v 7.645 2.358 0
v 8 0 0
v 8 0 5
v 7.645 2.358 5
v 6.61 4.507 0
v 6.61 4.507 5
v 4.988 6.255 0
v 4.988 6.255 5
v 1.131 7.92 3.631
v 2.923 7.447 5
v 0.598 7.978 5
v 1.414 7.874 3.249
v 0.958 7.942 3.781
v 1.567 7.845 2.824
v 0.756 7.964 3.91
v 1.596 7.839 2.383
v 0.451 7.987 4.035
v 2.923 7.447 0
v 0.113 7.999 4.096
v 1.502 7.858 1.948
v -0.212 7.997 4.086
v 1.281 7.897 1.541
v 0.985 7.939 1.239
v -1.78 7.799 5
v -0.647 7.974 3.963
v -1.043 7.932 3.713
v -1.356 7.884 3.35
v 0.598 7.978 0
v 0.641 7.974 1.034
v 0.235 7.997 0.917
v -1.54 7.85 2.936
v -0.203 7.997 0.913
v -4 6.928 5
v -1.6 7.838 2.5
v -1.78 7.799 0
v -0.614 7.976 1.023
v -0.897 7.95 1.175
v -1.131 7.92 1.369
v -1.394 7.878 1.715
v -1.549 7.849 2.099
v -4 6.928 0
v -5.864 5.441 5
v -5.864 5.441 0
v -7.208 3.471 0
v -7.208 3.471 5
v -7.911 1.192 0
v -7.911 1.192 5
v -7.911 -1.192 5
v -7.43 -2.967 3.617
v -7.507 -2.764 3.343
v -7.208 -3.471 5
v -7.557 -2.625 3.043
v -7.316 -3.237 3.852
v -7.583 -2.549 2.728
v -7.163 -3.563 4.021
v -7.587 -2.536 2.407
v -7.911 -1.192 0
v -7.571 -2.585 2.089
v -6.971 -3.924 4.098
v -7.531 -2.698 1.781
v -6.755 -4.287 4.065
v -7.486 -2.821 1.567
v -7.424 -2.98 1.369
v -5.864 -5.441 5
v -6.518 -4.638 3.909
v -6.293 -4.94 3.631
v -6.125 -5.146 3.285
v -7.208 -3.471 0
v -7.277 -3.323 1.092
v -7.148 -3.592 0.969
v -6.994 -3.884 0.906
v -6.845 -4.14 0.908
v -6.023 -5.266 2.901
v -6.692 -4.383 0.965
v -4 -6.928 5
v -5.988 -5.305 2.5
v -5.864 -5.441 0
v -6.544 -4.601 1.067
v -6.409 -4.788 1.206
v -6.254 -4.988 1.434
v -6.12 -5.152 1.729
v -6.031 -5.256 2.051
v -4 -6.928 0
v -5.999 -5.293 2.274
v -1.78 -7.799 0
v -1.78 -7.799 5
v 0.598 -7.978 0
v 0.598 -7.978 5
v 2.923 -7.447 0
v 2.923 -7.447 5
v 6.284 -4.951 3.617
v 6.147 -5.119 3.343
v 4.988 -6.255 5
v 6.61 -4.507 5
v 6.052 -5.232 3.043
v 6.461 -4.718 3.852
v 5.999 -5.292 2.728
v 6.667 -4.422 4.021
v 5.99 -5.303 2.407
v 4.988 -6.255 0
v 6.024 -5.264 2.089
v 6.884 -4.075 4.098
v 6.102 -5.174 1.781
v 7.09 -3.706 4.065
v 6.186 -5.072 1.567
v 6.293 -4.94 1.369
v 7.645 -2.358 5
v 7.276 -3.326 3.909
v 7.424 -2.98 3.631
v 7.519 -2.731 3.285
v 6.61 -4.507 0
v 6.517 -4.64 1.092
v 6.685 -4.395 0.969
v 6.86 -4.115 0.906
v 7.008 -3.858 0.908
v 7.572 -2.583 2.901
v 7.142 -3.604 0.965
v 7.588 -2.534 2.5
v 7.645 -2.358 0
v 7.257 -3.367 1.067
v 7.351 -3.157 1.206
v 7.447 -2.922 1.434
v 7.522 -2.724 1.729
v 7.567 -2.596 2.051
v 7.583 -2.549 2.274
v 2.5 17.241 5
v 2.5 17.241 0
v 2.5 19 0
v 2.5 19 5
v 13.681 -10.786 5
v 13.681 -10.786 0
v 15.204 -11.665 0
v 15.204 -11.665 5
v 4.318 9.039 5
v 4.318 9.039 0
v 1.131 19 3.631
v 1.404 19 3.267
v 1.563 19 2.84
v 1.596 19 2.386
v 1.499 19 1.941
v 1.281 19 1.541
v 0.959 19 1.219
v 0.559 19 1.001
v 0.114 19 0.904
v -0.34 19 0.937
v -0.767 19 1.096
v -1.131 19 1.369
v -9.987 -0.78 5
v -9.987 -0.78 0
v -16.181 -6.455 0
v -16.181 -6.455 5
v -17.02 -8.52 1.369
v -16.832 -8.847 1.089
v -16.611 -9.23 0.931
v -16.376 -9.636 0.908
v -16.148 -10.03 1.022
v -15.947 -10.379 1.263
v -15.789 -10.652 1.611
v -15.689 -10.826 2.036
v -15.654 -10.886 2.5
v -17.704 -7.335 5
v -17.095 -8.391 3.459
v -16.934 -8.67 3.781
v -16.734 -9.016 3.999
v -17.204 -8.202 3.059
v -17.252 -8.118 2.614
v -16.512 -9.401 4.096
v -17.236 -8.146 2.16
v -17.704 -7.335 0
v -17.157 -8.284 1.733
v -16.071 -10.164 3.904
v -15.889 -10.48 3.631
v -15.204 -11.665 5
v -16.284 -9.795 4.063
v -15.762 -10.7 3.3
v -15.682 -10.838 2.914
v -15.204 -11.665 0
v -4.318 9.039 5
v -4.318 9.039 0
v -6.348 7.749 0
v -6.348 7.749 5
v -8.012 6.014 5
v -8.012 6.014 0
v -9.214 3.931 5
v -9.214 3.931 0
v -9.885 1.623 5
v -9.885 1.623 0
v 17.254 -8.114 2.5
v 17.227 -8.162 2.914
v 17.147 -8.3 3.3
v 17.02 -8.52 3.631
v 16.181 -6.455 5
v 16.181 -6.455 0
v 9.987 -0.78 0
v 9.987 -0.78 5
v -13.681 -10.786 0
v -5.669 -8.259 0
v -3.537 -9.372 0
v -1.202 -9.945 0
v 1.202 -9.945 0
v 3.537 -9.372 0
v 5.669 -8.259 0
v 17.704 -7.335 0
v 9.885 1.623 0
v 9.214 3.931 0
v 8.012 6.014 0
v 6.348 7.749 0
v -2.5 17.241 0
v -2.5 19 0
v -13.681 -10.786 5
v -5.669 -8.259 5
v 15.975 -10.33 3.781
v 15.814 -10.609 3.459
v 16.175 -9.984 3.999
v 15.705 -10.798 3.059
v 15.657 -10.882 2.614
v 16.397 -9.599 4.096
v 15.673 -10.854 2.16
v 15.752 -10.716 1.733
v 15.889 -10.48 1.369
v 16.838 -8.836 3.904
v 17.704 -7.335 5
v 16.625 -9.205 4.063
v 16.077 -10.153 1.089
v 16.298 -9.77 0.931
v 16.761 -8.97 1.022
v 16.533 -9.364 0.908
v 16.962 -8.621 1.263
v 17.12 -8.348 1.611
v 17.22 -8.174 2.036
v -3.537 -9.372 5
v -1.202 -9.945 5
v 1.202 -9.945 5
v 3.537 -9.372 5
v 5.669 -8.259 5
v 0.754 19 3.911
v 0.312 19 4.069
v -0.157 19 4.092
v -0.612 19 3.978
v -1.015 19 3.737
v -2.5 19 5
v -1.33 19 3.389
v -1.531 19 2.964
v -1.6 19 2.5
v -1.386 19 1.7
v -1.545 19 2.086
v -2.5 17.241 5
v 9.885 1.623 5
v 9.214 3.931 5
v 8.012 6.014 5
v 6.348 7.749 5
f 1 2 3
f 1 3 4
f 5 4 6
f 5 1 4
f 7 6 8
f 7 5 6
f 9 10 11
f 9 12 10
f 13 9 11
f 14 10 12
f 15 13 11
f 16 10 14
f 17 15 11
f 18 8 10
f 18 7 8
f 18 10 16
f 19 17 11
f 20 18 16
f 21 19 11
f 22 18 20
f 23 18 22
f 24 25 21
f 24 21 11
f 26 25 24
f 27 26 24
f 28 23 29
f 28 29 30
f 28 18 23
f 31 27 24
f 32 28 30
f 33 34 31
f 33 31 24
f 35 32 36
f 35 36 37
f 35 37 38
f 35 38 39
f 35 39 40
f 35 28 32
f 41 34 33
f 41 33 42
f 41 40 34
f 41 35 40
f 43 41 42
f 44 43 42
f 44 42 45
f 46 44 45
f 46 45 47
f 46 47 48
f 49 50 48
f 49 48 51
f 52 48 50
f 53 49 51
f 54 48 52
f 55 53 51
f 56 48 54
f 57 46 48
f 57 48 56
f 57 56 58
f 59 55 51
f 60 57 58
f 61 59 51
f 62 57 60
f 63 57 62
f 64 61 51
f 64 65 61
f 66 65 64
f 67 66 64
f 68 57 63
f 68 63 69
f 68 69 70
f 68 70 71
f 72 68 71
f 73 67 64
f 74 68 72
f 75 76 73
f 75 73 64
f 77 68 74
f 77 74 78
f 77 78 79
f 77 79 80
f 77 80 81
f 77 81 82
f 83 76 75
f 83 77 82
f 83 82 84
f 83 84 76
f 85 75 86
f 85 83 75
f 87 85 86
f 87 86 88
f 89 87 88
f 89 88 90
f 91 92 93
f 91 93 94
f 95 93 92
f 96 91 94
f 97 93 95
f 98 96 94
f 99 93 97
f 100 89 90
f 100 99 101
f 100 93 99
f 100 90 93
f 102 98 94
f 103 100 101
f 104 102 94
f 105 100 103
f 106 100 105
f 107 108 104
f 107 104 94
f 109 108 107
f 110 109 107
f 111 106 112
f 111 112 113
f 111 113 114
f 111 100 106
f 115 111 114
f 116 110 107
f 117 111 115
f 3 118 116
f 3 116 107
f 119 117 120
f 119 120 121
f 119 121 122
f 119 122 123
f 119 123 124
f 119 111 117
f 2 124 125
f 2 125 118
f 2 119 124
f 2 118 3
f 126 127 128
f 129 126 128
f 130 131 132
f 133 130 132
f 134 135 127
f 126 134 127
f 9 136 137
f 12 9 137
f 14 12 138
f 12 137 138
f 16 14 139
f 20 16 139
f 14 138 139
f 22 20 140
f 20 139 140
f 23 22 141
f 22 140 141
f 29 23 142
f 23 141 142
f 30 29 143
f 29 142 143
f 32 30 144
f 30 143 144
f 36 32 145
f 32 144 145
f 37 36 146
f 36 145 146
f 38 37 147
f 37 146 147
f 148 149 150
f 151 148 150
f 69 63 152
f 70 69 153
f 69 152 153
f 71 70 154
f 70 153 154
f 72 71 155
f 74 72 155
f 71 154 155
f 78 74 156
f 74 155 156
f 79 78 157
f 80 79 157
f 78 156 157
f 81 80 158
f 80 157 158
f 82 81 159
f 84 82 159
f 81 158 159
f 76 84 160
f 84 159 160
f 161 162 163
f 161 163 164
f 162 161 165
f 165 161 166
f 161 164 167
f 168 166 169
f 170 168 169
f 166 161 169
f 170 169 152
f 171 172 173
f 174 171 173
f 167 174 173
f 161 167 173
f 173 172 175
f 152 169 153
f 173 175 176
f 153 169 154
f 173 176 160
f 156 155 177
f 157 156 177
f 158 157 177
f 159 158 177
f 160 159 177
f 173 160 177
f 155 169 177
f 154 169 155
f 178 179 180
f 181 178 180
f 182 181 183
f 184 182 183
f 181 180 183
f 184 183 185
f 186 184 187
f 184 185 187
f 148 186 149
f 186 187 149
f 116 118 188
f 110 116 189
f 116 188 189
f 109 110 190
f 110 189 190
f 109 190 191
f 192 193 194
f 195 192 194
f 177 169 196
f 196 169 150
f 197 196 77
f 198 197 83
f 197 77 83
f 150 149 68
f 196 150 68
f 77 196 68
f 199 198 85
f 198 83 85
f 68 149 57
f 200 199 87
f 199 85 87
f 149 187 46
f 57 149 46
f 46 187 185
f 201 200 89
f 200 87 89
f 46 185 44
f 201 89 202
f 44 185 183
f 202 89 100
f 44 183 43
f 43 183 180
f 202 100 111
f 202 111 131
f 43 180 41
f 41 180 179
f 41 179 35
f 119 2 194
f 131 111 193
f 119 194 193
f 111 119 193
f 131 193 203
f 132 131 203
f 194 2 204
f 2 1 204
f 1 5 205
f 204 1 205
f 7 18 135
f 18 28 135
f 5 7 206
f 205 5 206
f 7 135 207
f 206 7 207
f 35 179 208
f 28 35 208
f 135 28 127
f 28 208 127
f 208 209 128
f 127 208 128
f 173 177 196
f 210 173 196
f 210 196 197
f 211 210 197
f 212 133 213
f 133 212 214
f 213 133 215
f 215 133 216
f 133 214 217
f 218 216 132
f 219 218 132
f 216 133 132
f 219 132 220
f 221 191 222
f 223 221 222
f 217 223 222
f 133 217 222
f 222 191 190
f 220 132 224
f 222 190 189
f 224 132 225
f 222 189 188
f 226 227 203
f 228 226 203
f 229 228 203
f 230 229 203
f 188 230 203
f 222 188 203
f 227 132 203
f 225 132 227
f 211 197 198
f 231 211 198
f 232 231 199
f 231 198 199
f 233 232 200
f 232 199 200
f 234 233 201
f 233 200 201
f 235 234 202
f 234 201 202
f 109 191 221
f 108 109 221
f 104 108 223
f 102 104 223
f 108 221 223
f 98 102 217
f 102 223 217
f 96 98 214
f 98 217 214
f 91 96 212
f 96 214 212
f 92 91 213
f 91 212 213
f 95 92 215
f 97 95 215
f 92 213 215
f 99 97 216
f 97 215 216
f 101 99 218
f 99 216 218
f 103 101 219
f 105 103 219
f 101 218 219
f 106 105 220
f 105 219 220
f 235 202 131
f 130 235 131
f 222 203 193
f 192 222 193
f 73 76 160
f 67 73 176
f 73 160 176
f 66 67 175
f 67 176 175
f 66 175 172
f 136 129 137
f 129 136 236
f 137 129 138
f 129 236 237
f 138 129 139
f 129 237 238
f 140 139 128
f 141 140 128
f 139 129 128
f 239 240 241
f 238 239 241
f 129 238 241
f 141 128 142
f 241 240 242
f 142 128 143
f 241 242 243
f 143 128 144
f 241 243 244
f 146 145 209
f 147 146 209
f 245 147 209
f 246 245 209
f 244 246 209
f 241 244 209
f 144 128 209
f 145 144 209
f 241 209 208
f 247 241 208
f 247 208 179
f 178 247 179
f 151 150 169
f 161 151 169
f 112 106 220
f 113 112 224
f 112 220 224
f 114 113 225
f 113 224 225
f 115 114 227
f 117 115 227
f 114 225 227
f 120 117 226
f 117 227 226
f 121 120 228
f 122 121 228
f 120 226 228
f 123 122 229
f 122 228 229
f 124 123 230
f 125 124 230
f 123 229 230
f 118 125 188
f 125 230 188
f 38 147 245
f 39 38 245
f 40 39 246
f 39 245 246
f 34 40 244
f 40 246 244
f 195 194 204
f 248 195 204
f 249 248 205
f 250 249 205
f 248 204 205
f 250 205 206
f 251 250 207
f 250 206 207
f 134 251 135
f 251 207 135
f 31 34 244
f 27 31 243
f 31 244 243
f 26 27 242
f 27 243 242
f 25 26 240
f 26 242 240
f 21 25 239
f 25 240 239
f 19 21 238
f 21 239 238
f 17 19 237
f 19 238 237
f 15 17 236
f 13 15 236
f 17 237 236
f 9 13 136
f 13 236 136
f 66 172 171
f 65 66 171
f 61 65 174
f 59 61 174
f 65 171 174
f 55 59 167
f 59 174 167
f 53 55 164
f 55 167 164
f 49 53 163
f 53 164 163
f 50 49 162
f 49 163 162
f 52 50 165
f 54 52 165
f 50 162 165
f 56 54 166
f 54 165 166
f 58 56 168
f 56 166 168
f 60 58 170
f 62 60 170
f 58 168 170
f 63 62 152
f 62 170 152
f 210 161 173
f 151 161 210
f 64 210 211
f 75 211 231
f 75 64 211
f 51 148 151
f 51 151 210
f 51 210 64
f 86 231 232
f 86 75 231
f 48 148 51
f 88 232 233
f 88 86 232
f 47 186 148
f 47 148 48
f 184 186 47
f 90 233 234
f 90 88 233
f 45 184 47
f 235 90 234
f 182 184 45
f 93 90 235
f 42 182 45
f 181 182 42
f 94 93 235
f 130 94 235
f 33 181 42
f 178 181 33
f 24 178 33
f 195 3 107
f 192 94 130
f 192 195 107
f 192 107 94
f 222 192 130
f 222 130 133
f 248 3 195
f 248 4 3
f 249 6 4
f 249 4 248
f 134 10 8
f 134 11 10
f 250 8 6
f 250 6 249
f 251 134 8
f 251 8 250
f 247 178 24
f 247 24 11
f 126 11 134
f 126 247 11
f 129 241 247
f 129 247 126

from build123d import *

# Parameters (mm, degrees)
F0_R     = 8
F1_DEPTH = 5
F3_DEPTH = 15
F5_DEPTH = 15
F7_DEPTH = 15


with BuildPart() as f1:
    # F0 (on Top) → F1 (new body)
    with BuildSketch(Plane.XY):
        with BuildLine():
            Line((2.5, 17.2409396496), (2.5, 19))
            Line((2.5, 19), (-2.5, 19))
            Line((-2.5, 19), (-2.5, 17.2409396496))
            Line((-2.5, 17.2409396496), (-4.3183749452, 9.0387803215))
            ThreePointArc((-4.3183749452, 9.0387803215), (-8.6753059831, 5.0086902446), (-9.9870008502, -0.7795677551))
            Line((-9.9870008502, -0.7795677551), (-16.1810917216, -6.4554063153))
            Line((-16.1810917216, -6.4554063153), (-17.7044826719, -7.3349364905))
            Line((-17.7044826719, -7.3349364905), (-15.2044826719, -11.6650635095))
            Line((-15.2044826719, -11.6650635095), (-13.6810917216, -10.7855333342))
            Line((-13.6810917216, -10.7855333342), (-5.668625905, -8.2592125663))
            ThreePointArc((-5.668625905, -8.2592125663), (0, -10.0173804893), (5.668625905, -8.2592125663))
            Line((5.668625905, -8.2592125663), (13.6810917216, -10.7855333342))
            Line((13.6810917216, -10.7855333342), (15.2044826719, -11.6650635095))
            Line((15.2044826719, -11.6650635095), (17.7044826719, -7.3349364905))
            Line((17.7044826719, -7.3349364905), (16.1810917216, -6.4554063153))
            Line((16.1810917216, -6.4554063153), (9.9870008502, -0.7795677551))
            ThreePointArc((9.9870008502, -0.7795677551), (8.6753059831, 5.0086902446), (4.3183749452, 9.0387803215))
            Line((4.3183749452, 9.0387803215), (2.5, 17.2409396496))
        make_face()
        Circle(F0_R, mode=Mode.SUBTRACT)
    extrude(amount=F1_DEPTH)

    # F2 (on face) → F3 (cut)
    with BuildSketch(Plane(origin=(16.4544826719, -9.5, 0), x_dir=(0.5, 0.8660254038, 0), z_dir=(0.8660254038, -0.5, 0))):
        with BuildLine():
            ThreePointArc((1.6, 2.5), (1.478207252, 3.1122934918), (1.1313708499, 3.6313708499))
            Line((1.1313708499, 3.6313708499), (-1.1313708499, 1.3686291501))
            ThreePointArc((-1.1313708499, 1.3686291501), (0.6122934918, 1.021792748), (1.6, 2.5))
        make_face()
        with BuildLine():
            Line((-1.1313708499, 1.3686291501), (1.1313708499, 3.6313708499))
            ThreePointArc((1.1313708499, 3.6313708499), (-1.1313708499, 3.6313708499), (-1.1313708499, 1.3686291501))
        make_face()
    extrude(amount=-F3_DEPTH, mode=Mode.SUBTRACT)

    # F4 (on face) → F5 (cut)
    with BuildSketch(Plane(origin=(0, 19, 0), x_dir=(-1, 0, 0), z_dir=(0, 1, 0))):
        with BuildLine():
            Line((-1.1313708499, 3.6313708499), (1.1313708499, 1.3686291501))
            ThreePointArc((1.1313708499, 1.3686291501), (1.478207252, 1.8877065082), (1.6, 2.5))
            ThreePointArc((1.6, 2.5), (0.6122934918, 3.978207252), (-1.1313708499, 3.6313708499))
        make_face()
        with BuildLine():
            ThreePointArc((-1.1313708499, 3.6313708499), (-1.1313708499, 1.3686291501), (1.1313708499, 1.3686291501))
            Line((1.1313708499, 1.3686291501), (-1.1313708499, 3.6313708499))
        make_face()
    extrude(amount=-F5_DEPTH, mode=Mode.SUBTRACT)

    # F6 (on face) → F7 (cut)
    with BuildSketch(Plane(origin=(-16.4544826719, -9.5, 0), x_dir=(0.5, -0.8660254038, 0), z_dir=(-0.8660254038, -0.5, 0))):
        with BuildLine():
            ThreePointArc((1.1313708499, 3.6313708499), (-1.1313708499, 3.6313708499), (-1.1313708499, 1.3686291501))
            Line((-1.1313708499, 1.3686291501), (1.1313708499, 3.6313708499))
        make_face()
        with BuildLine():
            Line((1.1313708499, 3.6313708499), (-1.1313708499, 1.3686291501))
            ThreePointArc((-1.1313708499, 1.3686291501), (0.6122934918, 1.021792748), (1.6, 2.5))
            ThreePointArc((1.6, 2.5), (1.478207252, 3.1122934918), (1.1313708499, 3.6313708499))
        make_face()
    extrude(amount=-F7_DEPTH, mode=Mode.SUBTRACT)


solid = f1.part
